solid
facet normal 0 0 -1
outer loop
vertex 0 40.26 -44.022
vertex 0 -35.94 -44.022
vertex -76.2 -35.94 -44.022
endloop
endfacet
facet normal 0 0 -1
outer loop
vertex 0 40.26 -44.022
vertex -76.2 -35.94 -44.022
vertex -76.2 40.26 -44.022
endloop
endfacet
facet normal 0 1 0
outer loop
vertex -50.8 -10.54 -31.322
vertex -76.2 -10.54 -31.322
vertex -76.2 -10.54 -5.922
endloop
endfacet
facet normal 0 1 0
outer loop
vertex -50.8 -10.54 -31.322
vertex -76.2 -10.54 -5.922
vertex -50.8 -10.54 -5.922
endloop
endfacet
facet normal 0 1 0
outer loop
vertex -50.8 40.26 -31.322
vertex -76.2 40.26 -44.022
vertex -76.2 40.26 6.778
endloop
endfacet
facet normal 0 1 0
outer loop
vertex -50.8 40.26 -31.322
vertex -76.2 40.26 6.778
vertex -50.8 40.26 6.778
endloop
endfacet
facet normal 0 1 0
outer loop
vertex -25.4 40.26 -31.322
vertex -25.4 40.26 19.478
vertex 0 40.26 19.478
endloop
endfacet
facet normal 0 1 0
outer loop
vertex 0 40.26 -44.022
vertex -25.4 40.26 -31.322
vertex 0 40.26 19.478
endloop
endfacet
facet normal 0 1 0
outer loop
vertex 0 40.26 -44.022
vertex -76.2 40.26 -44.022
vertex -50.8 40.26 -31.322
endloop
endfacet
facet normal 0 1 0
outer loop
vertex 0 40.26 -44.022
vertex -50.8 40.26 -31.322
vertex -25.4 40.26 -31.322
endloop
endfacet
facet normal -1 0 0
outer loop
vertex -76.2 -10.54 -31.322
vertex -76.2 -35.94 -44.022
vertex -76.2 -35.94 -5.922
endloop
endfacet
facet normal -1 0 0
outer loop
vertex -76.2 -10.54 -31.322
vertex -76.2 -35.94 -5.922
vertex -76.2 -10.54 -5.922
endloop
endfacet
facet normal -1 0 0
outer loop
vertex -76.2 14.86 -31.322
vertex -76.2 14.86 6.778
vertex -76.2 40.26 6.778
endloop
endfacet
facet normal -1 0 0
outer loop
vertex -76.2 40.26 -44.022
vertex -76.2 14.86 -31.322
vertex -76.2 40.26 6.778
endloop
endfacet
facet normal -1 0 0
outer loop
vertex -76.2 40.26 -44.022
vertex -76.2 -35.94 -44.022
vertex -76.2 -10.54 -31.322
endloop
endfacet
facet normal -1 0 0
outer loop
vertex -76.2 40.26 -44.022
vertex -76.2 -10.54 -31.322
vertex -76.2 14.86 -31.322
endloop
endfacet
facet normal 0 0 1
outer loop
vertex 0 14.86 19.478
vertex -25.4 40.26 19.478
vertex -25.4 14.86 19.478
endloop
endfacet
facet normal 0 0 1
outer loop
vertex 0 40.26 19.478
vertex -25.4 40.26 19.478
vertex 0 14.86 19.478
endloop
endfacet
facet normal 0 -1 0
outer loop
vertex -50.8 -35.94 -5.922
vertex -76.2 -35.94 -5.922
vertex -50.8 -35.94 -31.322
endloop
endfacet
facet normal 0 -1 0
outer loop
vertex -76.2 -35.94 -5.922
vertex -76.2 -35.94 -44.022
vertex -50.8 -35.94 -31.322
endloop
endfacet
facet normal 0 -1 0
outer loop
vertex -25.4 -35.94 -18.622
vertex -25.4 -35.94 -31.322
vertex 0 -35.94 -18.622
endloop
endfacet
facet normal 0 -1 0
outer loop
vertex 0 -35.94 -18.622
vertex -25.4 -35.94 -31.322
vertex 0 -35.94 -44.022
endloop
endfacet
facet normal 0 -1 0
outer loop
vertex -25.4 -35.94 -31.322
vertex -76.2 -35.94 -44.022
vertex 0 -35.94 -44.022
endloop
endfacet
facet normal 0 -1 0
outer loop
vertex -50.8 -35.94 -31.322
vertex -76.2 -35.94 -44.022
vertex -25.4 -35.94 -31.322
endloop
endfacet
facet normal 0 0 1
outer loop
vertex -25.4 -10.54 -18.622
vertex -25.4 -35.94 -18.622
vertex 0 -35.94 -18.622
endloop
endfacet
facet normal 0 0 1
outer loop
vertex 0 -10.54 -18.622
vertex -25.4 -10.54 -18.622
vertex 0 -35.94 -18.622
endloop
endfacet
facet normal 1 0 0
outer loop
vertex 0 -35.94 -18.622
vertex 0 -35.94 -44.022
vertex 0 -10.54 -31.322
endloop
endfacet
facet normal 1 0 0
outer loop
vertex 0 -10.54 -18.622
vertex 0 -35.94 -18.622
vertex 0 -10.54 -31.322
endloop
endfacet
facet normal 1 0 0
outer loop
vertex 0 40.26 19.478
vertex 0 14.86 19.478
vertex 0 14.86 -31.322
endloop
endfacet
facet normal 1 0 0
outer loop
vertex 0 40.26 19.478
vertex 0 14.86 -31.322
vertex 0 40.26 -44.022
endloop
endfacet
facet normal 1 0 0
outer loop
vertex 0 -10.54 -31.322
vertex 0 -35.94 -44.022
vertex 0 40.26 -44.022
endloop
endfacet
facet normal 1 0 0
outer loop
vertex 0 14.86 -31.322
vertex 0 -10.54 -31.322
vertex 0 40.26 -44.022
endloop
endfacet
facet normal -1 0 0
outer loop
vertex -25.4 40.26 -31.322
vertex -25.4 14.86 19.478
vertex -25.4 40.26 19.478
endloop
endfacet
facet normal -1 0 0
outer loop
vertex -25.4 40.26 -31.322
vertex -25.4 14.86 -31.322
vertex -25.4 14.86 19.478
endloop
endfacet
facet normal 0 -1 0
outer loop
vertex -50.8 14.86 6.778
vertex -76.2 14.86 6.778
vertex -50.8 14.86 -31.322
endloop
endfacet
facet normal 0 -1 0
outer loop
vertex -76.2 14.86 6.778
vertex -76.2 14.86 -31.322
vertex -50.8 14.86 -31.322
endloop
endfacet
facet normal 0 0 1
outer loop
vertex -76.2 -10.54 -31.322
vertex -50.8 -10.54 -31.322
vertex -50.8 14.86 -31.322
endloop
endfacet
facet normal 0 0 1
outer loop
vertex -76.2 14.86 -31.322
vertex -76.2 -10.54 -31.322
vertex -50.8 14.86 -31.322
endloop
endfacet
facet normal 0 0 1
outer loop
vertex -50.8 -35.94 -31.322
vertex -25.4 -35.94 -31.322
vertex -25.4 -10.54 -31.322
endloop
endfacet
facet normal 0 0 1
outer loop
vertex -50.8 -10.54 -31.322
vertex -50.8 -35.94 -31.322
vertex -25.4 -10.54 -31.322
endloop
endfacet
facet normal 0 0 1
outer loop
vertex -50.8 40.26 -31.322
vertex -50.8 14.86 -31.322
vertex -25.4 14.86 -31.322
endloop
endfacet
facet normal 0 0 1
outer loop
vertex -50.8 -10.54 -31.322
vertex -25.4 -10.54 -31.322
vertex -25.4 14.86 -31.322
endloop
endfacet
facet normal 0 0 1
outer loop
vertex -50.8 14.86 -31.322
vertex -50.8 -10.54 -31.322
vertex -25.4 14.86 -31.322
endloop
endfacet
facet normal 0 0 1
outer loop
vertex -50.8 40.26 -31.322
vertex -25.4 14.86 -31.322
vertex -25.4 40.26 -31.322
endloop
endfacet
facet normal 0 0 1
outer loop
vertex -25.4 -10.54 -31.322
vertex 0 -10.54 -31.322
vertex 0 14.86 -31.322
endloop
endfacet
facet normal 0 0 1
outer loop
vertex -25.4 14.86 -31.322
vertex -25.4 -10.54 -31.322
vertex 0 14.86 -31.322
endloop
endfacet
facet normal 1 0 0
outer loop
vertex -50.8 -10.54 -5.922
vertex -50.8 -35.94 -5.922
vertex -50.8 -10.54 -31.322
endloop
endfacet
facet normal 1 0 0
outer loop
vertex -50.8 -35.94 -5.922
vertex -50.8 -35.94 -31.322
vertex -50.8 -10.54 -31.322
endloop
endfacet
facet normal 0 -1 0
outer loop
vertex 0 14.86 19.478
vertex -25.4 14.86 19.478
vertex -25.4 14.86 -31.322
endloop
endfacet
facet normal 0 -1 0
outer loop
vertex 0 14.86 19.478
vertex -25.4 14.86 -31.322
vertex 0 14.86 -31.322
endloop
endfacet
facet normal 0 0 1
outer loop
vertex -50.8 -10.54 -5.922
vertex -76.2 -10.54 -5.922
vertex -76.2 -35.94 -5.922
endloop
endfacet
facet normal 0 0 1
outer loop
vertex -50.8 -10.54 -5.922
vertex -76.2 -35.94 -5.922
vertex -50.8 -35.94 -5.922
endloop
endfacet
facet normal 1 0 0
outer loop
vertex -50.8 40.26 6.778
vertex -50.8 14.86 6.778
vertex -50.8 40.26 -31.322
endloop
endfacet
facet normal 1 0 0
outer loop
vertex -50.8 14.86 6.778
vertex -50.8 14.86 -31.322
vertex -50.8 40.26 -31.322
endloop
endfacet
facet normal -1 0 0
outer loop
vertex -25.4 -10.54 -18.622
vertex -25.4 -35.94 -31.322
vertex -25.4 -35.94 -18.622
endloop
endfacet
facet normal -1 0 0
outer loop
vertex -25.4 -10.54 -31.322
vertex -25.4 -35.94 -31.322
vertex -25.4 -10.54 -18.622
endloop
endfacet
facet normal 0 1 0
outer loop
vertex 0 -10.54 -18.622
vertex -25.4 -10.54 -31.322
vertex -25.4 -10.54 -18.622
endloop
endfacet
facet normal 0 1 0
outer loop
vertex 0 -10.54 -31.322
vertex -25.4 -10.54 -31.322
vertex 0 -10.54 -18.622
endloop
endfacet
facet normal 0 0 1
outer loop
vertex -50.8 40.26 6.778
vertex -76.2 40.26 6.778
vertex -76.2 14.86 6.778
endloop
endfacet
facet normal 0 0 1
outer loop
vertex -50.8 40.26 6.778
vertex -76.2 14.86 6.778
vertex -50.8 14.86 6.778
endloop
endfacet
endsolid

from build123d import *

# Parameters (mm, degrees)
F0_W      = 76.2
F0_H      = 12.7
F1_DEPTH  = 76.2
F2_W      = 25.4
F2_H      = 25.4
F3_DEPTH  = 12.7
F3_FACE_W = 25.4
F3_FACE_H = 25.4
F4_DEPTH  = 12.7
F5_DEPTH  = 38.1
F6_DEPTH  = 25.4


with BuildPart() as f1:
    # F0 (on Right) → F1 (new body)
    with BuildSketch(Plane.YZ):
        with Locations((2.160154, -37.671763)):
            Rectangle(F0_W, F0_H)
    extrude(amount=-F1_DEPTH)

    # F2 (on face) → F3 (join)
    with BuildSketch(Plane.XY.offset(-31.321763)):
        with Locations((-12.7, -23.239846)):
            Rectangle(F2_W, F2_H)
        with Locations((-63.5, -23.239846)):
            Rectangle(F2_W, F2_H)
        with Locations((-12.7, 27.560154)):
            Rectangle(F2_W, F2_H)
        with Locations((-63.5, 27.560154)):
            Rectangle(F2_W, F2_H)
    extrude(amount=F3_DEPTH)

    # F3_face (on face) → F4 (join)
    with BuildSketch(Plane(origin=(-63.5, -23.239846, -18.621763), x_dir=(1, 0, 0), z_dir=(0, 0, 1))):
        Rectangle(F3_FACE_W, F3_FACE_H)
    extrude(amount=F4_DEPTH)

    # F3_face (on face) → F5 (join)
    with BuildSketch(Plane(origin=(-63.5, -23.239846, -18.621763), x_dir=(1, 0, 0), z_dir=(0, 0, 1))):
        with Locations((50.8, 50.8)):
            Rectangle(F3_FACE_W, F3_FACE_H)
    extrude(amount=F5_DEPTH)

    # F3_face (on face) → F6 (join)
    with BuildSketch(Plane(origin=(-63.5, -23.239846, -18.621763), x_dir=(1, 0, 0), z_dir=(0, 0, 1))):
        with Locations((0, 50.8)):
            Rectangle(F3_FACE_W, F3_FACE_H)
    extrude(amount=F6_DEPTH)


solid = f1.part
